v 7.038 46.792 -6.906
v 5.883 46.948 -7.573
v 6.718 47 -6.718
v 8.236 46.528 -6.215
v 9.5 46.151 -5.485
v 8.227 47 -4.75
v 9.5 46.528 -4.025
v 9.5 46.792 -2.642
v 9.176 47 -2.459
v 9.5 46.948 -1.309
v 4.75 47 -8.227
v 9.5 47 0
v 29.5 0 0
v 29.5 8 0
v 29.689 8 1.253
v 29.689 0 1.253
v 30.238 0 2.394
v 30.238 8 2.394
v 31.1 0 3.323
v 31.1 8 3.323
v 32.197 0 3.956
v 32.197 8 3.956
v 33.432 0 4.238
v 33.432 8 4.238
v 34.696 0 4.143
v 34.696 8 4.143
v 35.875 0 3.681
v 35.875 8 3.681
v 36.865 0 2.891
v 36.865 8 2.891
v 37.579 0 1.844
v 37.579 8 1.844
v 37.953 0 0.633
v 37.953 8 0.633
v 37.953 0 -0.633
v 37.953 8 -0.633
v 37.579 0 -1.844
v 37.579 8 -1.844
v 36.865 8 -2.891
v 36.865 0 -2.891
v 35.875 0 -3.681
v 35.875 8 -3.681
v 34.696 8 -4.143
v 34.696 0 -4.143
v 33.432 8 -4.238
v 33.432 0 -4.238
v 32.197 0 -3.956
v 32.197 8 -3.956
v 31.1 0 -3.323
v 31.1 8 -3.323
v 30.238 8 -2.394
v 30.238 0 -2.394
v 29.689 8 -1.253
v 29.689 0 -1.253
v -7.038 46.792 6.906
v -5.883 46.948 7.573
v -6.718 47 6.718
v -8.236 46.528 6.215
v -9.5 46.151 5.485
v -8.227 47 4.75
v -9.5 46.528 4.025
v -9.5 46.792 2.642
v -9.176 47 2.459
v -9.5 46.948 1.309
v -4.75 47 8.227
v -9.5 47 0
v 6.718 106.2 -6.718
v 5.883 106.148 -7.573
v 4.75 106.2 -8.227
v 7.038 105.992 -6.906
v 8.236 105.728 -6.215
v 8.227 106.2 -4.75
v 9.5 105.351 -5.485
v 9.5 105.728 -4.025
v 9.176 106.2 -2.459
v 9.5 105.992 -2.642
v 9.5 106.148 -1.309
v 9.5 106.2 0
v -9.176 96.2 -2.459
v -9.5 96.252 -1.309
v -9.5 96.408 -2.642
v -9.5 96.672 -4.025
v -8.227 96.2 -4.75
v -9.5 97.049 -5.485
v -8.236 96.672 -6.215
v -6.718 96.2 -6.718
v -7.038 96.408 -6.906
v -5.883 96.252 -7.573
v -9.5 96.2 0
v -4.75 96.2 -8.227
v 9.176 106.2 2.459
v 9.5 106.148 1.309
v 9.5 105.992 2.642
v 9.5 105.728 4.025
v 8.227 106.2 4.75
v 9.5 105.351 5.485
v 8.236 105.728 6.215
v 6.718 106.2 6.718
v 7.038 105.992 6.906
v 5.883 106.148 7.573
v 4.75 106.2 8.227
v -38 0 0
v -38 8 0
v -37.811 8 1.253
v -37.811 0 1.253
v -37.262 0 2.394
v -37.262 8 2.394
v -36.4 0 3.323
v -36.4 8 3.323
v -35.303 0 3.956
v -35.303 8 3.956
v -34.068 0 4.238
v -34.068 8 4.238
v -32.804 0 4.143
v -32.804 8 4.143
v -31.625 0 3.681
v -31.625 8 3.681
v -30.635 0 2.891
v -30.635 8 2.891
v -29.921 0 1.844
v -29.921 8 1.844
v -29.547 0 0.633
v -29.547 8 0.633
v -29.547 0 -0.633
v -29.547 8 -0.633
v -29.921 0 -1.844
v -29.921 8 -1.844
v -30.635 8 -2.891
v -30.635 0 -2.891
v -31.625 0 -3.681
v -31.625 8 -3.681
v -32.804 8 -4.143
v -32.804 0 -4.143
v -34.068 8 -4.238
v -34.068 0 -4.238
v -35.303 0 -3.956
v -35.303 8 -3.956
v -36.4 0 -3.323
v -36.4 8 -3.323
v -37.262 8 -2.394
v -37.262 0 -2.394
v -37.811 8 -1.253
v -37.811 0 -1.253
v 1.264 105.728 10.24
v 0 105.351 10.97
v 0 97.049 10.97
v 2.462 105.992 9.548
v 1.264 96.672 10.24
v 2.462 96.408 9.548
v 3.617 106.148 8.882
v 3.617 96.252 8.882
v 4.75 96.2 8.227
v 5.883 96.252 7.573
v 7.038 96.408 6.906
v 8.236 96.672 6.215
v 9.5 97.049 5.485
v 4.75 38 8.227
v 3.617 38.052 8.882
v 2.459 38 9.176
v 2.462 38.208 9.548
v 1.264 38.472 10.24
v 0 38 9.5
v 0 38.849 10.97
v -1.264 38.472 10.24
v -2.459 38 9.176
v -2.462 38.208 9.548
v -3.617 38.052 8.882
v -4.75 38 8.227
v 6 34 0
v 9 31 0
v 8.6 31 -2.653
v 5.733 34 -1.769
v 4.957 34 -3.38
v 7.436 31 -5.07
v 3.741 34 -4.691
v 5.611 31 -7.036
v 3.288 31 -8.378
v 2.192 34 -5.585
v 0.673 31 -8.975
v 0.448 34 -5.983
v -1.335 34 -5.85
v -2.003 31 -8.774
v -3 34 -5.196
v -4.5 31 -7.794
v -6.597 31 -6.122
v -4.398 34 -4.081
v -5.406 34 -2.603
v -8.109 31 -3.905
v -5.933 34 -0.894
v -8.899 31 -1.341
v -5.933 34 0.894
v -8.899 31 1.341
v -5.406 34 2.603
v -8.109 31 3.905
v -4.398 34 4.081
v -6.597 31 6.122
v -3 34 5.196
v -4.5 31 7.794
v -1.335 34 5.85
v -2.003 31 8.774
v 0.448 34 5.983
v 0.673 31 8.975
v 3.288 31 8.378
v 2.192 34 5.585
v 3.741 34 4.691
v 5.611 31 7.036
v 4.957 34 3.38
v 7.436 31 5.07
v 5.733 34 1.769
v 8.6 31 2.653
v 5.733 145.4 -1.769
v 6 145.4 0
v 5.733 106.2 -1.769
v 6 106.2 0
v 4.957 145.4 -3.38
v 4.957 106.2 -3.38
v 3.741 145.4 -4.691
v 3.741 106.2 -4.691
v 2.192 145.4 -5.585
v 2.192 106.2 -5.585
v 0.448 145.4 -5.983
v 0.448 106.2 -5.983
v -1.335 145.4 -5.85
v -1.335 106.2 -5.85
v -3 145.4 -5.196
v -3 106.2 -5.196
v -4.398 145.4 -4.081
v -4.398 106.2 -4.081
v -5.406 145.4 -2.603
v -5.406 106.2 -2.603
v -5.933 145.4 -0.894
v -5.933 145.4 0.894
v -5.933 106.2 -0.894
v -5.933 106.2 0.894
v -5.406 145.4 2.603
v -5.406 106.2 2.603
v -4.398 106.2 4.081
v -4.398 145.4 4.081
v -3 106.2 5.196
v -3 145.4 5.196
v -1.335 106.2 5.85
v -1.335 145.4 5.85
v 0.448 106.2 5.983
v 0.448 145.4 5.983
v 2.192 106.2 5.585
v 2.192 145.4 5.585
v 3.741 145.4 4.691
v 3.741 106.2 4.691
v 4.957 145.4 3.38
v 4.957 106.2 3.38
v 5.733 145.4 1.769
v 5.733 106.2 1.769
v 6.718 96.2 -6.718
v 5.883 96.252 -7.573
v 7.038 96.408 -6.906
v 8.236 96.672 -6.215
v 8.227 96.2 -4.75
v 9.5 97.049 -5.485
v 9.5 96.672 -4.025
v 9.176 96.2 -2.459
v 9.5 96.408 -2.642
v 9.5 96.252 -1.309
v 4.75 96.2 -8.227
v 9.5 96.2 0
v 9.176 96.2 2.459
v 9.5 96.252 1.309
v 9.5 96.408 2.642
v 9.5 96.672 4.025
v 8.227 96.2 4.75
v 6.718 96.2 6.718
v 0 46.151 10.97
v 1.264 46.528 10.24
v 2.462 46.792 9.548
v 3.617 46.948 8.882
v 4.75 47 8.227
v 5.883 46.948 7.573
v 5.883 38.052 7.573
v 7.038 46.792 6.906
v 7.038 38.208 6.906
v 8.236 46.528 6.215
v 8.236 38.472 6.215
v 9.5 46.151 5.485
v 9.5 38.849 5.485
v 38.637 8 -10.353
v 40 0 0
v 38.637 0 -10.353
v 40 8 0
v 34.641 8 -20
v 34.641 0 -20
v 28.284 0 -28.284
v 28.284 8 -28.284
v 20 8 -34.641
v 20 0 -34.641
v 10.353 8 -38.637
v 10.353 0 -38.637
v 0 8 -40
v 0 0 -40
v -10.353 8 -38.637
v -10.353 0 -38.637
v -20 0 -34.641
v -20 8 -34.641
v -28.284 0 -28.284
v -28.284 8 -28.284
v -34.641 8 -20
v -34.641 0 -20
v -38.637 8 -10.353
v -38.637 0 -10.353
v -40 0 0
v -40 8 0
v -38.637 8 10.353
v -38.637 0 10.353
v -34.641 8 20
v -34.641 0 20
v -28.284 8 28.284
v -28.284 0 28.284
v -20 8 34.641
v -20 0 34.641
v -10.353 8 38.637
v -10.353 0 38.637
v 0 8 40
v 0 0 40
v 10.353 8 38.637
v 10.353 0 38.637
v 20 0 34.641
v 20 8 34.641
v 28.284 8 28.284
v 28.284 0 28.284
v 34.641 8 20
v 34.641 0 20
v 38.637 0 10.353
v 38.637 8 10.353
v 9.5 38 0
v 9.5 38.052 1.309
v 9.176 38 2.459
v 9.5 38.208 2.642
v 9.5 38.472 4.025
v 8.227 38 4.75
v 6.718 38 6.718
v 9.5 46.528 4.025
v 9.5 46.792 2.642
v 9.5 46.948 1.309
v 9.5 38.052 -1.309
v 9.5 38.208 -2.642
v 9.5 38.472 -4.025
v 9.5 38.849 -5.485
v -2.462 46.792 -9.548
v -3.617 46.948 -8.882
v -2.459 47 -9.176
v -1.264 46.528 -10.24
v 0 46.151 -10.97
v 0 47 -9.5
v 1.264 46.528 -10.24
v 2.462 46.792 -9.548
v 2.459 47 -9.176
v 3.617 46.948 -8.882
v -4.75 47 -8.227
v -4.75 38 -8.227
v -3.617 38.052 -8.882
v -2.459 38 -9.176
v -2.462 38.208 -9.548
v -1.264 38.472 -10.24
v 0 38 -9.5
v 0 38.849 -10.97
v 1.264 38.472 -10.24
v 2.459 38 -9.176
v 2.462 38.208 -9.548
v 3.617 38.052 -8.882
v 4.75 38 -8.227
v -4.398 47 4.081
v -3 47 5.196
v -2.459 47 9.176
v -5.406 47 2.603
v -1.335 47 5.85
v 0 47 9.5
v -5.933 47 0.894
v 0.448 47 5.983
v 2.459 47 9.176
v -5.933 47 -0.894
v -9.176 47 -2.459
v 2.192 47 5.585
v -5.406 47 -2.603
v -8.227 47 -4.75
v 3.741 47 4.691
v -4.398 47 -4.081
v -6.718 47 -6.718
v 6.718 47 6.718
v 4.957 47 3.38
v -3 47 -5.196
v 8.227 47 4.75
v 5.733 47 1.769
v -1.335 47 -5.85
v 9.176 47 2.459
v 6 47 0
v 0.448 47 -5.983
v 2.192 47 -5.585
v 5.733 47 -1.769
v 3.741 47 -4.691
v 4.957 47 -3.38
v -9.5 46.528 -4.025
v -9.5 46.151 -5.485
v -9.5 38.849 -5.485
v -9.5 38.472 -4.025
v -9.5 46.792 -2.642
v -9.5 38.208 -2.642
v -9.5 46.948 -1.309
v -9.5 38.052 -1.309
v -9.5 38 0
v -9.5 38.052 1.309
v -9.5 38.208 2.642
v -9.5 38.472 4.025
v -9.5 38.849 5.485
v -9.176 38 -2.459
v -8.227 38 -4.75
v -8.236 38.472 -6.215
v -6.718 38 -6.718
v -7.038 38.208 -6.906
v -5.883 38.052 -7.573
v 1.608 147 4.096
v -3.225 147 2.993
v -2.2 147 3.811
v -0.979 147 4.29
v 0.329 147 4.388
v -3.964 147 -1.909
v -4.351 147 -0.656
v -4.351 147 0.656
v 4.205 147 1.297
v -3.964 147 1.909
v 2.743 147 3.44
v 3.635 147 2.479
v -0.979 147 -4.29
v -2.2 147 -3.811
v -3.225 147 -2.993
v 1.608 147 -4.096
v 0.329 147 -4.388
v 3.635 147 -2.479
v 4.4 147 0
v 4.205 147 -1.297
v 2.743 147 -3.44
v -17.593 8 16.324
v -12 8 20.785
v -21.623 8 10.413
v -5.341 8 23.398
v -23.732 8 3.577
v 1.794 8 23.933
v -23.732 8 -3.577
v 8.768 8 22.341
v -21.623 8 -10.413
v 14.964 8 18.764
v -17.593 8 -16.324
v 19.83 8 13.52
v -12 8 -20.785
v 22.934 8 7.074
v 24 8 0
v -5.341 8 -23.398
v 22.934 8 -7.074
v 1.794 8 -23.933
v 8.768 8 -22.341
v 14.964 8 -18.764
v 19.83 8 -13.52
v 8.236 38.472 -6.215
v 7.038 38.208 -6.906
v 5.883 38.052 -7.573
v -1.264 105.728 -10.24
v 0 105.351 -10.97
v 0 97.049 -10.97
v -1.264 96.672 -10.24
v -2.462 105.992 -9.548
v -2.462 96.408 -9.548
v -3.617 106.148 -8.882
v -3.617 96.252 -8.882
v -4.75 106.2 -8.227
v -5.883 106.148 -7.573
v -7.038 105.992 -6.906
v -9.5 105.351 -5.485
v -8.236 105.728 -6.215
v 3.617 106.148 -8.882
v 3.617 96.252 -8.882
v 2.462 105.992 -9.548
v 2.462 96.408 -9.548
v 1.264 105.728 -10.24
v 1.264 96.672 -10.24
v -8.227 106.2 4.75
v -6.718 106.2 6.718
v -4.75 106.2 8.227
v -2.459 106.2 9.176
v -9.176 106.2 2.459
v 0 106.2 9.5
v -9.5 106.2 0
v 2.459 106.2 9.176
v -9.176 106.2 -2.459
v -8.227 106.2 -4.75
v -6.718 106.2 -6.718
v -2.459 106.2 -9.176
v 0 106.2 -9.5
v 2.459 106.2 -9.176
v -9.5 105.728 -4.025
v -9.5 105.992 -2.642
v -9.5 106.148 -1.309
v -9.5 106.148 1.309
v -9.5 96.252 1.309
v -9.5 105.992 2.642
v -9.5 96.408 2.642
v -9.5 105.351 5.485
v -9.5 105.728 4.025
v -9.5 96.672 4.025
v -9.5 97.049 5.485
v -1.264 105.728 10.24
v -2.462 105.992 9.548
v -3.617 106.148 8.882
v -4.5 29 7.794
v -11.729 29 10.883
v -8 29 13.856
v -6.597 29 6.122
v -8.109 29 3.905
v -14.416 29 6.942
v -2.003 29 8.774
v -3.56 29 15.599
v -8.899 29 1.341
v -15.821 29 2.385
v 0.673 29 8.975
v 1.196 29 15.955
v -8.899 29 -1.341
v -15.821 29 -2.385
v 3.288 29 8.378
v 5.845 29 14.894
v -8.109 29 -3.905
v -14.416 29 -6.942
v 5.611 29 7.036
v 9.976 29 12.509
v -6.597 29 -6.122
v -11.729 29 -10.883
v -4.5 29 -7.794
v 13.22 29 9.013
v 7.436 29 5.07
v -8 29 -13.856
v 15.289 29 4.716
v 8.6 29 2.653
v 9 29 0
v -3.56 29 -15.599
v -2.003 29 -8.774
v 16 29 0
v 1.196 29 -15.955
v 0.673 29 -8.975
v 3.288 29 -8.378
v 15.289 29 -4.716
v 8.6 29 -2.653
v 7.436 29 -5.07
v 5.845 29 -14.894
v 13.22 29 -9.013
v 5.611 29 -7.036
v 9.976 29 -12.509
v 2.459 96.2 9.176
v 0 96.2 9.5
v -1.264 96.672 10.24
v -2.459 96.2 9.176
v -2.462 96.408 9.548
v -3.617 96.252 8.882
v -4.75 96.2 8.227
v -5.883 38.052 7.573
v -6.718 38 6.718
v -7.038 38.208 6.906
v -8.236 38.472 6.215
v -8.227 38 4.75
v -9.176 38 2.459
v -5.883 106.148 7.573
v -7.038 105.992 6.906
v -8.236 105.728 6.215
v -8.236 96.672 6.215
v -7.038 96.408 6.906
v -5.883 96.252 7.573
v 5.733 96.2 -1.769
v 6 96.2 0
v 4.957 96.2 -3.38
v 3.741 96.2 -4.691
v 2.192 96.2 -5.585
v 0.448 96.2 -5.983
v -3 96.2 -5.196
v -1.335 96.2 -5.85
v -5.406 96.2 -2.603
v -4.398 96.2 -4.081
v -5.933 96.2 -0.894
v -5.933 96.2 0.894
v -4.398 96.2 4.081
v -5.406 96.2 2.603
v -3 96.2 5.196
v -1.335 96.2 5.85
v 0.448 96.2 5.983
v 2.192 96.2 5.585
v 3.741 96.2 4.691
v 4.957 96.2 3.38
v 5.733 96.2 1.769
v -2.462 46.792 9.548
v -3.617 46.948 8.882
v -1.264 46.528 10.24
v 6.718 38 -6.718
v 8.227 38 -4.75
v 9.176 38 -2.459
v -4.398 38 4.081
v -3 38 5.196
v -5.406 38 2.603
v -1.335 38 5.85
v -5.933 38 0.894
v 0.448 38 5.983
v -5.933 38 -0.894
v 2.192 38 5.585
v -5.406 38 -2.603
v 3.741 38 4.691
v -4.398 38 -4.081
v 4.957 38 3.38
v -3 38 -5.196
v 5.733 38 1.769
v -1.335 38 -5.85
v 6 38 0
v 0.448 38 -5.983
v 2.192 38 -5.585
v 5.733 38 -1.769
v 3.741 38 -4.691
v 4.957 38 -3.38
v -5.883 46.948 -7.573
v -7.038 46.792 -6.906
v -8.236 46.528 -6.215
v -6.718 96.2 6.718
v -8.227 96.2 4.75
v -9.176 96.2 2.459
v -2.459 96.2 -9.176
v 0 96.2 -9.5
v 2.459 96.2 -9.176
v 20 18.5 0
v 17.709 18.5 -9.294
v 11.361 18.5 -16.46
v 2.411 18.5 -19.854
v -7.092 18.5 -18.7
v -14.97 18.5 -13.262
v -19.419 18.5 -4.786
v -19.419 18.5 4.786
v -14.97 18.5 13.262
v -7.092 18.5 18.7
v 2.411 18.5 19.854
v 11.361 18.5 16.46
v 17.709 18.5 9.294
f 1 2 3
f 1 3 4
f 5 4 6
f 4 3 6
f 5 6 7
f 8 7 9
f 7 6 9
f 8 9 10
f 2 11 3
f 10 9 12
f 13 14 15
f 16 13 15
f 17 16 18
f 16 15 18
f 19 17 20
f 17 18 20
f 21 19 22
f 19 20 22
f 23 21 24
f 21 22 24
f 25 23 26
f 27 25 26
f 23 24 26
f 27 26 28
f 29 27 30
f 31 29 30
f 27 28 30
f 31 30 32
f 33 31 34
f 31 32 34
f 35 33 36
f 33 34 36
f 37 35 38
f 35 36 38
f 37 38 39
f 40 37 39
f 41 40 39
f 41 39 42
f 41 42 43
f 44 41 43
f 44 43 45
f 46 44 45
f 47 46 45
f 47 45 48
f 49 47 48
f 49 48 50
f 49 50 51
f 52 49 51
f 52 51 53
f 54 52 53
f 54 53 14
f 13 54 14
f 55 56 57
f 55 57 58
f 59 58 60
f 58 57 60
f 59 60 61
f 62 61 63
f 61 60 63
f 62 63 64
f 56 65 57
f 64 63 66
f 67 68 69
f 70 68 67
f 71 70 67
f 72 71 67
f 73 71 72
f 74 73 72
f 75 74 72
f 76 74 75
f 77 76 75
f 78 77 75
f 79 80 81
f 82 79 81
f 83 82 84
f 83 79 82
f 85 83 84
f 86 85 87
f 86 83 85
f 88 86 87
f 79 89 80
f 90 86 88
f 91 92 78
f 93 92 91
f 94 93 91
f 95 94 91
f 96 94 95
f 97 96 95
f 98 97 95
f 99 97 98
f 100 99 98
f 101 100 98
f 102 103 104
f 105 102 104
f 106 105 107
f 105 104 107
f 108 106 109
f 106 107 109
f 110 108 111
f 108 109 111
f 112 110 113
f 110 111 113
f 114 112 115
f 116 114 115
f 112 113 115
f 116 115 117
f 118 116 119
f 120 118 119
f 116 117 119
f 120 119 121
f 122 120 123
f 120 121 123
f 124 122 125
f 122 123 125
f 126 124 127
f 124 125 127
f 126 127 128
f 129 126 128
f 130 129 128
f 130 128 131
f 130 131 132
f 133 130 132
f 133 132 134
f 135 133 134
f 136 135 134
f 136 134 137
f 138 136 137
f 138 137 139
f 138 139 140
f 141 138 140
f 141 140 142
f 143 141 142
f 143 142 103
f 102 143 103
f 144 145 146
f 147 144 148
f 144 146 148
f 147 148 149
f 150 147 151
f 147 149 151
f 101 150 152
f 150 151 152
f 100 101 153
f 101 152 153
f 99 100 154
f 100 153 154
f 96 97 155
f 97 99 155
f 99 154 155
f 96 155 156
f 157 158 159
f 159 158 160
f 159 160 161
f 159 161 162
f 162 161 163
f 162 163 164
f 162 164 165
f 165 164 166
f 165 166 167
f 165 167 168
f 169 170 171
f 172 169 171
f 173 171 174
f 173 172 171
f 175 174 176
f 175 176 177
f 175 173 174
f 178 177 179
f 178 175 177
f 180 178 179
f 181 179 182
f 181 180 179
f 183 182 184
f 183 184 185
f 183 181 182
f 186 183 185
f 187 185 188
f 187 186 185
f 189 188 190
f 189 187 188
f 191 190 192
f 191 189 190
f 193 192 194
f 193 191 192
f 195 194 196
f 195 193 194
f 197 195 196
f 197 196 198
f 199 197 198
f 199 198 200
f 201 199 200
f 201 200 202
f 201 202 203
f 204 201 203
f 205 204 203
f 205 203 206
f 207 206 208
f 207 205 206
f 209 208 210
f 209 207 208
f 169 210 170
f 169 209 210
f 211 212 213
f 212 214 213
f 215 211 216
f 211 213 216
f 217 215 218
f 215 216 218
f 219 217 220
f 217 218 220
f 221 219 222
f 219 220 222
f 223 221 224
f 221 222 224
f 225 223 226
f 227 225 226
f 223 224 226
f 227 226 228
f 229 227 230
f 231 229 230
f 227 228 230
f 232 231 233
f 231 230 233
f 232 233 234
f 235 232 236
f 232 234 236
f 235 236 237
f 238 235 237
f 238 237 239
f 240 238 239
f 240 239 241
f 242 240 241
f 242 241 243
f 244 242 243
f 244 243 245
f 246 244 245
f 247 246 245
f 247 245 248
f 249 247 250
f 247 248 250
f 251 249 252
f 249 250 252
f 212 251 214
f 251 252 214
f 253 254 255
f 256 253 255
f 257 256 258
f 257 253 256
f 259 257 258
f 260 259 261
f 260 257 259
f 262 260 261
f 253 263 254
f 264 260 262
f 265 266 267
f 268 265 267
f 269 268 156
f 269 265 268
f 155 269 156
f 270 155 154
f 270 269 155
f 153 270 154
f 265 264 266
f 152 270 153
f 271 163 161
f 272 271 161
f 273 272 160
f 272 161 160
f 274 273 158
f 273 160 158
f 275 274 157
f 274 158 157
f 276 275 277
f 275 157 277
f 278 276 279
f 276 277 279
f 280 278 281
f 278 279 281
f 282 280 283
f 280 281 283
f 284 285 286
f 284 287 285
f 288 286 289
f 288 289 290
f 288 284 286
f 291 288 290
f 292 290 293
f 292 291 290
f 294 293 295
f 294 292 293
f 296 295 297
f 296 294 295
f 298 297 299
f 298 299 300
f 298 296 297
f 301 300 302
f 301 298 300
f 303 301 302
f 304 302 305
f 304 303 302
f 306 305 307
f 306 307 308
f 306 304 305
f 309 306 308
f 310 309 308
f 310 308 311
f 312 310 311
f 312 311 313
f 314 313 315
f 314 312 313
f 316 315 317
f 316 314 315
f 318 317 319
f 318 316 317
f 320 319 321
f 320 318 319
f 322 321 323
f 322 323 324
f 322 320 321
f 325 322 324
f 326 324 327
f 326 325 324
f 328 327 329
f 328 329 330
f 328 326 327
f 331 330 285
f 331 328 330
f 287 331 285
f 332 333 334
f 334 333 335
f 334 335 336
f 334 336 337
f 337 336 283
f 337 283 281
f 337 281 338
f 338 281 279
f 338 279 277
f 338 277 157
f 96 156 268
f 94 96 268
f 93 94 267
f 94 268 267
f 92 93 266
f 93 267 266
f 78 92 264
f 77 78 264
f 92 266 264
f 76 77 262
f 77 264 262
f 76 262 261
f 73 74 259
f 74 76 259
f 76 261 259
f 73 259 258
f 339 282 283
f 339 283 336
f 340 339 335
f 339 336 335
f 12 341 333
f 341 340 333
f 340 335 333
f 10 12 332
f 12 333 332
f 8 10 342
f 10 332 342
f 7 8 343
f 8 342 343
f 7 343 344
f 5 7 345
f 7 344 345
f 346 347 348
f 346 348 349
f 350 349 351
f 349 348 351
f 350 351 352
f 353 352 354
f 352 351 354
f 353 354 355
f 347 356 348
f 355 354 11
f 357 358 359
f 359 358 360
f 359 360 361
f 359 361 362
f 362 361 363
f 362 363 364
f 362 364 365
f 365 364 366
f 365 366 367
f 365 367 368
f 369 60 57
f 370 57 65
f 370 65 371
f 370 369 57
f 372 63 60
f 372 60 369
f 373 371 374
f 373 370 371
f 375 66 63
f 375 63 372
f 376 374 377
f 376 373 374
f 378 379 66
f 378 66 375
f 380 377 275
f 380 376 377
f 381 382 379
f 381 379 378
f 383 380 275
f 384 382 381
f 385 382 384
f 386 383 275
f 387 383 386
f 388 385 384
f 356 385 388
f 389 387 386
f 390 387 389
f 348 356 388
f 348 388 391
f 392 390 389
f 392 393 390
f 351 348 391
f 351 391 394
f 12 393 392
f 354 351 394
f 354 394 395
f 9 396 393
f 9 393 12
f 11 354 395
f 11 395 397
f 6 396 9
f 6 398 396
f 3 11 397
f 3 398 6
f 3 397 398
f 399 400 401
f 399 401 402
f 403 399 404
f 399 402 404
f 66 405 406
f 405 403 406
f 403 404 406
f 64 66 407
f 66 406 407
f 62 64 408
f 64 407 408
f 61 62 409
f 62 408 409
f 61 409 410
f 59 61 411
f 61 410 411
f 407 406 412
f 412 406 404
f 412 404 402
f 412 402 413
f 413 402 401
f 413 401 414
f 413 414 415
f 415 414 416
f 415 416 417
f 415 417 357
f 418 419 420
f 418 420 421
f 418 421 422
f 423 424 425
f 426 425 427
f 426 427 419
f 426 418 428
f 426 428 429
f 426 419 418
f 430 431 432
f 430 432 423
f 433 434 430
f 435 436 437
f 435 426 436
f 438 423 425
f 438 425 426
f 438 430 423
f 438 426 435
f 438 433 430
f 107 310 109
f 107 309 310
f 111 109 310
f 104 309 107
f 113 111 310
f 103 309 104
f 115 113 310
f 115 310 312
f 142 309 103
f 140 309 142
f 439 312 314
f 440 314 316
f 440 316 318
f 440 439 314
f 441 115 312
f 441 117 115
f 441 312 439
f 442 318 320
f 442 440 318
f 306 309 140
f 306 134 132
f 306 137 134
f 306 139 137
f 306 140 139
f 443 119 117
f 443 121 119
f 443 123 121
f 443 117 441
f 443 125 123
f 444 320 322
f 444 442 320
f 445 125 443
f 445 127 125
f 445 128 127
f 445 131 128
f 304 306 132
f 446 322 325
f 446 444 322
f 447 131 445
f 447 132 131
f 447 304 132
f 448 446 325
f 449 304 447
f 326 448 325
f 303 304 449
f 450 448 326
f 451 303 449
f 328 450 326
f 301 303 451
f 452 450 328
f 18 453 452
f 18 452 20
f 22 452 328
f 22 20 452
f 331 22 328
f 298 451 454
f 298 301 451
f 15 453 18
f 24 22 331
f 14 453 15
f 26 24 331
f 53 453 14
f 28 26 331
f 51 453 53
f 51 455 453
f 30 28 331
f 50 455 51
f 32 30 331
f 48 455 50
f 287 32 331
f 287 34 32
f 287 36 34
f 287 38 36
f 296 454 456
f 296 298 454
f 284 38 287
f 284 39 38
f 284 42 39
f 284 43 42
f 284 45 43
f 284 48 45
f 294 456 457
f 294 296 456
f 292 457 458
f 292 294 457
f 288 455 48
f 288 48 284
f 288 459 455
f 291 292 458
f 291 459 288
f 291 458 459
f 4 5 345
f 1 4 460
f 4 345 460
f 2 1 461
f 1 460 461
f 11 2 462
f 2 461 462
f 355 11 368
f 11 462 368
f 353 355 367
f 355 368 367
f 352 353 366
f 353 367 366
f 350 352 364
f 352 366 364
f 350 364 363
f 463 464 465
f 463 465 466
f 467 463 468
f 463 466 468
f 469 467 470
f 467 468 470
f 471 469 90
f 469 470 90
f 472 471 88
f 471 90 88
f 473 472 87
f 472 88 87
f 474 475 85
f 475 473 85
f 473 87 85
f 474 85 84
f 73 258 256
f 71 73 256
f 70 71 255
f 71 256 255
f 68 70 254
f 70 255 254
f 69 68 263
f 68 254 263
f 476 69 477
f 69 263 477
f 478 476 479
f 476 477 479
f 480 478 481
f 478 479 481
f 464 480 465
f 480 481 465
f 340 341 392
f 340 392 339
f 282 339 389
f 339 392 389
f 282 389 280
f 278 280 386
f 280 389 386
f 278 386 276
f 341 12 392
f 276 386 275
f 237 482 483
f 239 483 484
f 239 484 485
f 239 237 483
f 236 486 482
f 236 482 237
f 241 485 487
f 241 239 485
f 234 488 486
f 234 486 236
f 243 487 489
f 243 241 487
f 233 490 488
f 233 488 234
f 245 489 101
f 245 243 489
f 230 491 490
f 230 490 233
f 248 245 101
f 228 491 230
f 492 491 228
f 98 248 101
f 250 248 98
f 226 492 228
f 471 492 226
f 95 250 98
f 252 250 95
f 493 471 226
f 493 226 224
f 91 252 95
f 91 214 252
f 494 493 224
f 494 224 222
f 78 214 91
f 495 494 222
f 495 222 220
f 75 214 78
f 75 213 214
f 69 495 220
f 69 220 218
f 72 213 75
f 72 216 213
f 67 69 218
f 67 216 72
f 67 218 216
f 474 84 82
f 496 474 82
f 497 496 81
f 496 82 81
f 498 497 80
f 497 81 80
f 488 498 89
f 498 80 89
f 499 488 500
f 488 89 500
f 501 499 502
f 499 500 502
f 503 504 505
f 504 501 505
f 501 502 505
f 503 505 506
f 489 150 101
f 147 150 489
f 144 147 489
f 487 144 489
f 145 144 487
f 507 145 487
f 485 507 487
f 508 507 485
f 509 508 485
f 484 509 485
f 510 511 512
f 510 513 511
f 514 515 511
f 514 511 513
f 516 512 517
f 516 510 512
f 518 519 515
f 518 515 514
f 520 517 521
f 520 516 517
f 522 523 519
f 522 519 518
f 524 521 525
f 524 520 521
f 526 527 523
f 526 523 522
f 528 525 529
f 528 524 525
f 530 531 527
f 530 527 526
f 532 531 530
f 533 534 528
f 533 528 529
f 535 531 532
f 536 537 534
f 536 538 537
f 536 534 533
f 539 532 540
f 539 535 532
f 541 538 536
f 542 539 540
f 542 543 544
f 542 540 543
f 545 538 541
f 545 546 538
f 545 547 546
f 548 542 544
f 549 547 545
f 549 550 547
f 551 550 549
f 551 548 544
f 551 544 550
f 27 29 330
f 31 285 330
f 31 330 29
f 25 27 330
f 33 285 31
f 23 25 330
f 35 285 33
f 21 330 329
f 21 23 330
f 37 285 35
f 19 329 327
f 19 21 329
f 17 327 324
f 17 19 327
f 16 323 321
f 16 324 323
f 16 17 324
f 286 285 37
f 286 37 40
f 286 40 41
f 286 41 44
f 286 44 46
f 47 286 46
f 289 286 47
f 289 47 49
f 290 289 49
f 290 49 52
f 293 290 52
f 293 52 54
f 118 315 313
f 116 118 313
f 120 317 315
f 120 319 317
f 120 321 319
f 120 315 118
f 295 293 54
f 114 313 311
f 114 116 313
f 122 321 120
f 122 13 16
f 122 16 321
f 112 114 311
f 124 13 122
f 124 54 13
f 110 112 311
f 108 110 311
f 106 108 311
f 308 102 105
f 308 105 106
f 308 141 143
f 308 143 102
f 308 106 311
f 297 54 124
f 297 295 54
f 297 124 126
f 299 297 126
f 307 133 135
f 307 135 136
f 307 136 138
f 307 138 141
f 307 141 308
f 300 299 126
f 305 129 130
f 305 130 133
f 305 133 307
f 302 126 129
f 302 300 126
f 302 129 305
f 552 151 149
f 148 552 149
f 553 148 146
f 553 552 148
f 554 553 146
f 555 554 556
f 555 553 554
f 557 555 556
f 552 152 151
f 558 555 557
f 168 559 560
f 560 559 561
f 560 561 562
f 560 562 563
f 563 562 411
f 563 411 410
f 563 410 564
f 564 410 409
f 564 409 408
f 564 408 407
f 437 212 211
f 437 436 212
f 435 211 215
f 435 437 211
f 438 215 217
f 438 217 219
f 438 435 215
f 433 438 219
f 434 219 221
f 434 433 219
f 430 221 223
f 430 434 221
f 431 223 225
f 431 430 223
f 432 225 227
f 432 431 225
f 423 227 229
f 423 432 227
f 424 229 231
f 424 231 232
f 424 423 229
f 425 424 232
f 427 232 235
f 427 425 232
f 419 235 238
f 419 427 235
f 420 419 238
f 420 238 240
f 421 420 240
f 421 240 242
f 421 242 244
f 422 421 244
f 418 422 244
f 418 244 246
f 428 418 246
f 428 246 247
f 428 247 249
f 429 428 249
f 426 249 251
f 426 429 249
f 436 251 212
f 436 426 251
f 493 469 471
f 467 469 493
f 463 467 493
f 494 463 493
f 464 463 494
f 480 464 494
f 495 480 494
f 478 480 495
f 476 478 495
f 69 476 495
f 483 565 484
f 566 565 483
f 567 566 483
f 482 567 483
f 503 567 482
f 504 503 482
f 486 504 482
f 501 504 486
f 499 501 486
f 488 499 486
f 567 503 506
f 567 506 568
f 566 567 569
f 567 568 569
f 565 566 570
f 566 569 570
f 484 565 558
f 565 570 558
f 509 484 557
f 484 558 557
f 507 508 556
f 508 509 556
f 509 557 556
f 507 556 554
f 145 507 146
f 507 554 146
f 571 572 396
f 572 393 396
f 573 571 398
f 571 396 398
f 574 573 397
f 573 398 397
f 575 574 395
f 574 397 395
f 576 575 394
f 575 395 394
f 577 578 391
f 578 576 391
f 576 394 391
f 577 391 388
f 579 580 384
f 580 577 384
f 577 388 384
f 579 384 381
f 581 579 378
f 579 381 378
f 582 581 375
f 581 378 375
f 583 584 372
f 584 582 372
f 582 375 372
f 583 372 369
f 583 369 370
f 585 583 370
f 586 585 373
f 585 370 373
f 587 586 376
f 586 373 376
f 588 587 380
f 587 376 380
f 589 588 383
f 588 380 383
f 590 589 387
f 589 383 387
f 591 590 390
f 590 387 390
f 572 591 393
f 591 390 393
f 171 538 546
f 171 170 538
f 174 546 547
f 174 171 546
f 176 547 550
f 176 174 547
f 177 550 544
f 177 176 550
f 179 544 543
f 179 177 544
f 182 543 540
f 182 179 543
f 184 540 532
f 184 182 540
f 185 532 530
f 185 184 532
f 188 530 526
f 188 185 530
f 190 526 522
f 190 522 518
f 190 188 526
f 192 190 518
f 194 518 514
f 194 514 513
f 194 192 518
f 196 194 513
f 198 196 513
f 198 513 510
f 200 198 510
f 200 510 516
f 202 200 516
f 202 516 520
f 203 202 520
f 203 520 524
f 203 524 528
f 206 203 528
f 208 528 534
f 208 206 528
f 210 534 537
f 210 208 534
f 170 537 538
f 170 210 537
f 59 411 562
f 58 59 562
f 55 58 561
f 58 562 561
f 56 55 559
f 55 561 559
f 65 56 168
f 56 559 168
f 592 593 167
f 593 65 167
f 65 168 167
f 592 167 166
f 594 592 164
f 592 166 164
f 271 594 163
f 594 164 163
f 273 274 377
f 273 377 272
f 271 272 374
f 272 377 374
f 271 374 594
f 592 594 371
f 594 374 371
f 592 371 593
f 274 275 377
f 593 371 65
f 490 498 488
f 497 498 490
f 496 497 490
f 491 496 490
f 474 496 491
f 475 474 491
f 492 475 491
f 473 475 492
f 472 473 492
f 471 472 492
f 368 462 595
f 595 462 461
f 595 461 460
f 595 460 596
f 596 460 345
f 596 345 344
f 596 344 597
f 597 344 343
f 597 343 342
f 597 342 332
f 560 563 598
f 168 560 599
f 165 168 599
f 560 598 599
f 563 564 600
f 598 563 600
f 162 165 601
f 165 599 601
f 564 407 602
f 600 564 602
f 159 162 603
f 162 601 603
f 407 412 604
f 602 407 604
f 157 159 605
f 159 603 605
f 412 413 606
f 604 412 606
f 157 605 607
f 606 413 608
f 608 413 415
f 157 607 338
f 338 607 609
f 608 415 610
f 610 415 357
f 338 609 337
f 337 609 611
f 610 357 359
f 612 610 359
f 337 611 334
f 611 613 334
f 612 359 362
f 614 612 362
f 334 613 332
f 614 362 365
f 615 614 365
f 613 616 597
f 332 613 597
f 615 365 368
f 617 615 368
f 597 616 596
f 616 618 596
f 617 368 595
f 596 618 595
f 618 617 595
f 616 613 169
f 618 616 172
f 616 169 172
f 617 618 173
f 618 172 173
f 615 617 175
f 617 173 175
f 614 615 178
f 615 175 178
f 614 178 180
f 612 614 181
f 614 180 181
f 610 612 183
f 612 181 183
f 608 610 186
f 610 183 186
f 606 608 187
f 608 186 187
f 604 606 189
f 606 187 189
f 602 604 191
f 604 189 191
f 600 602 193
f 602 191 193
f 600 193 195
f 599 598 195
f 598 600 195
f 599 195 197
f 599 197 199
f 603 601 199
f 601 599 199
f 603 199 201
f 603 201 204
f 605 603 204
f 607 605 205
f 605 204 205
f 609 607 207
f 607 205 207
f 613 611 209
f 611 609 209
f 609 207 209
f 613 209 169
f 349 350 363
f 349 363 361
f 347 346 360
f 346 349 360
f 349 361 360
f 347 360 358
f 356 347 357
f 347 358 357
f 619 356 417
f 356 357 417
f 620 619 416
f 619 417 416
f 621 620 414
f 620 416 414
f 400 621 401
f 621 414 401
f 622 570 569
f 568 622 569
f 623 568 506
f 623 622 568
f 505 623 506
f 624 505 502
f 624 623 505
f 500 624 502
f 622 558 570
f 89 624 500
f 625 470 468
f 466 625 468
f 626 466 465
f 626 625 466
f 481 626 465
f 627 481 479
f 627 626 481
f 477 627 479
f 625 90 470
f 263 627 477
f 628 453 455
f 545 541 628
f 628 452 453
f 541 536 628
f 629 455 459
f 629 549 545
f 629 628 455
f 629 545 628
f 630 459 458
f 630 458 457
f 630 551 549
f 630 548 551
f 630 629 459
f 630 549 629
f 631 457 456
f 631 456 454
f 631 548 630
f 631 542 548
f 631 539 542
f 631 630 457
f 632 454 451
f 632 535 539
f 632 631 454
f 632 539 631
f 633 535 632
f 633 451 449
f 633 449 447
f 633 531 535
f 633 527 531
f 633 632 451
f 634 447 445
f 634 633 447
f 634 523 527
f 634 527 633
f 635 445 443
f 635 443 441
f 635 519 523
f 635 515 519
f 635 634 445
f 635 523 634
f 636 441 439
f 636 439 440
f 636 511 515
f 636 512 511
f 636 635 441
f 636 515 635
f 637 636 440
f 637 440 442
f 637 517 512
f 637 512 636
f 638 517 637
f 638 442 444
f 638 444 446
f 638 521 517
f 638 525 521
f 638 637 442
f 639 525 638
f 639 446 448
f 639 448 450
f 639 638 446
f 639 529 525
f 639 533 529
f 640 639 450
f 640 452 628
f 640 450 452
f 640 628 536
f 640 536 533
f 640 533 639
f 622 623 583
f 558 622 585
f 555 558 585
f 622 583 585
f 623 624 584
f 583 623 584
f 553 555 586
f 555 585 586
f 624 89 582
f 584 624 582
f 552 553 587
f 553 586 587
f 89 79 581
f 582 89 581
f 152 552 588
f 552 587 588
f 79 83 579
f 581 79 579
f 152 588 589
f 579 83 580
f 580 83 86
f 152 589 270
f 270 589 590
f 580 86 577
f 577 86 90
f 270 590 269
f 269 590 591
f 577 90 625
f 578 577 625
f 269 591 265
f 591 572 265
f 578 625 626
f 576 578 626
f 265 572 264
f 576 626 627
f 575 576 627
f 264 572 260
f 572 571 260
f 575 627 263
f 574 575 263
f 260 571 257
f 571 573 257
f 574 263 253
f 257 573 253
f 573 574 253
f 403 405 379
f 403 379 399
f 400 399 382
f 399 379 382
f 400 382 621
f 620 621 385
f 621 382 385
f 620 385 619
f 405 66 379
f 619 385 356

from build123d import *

# Parameters (mm, degrees)
EXTRUDE_1_DEPTH     = 9
EXTRUDE_2_DEPTH     = 10
SKETCH_5_R          = 4.25
CUT_EXTRUDE_1_DEPTH = 9


with BuildPart() as part:
    # Эскиз1 → Повернуть1 (revolve)
    with BuildSketch(Plane.XY, mode=Mode.PRIVATE) as revolve_1_sk:
        Polygon((0, 0), (-40, 0), (-40, 8), (-24, 8), (-16, 29), (-9, 29), (-9, 31), (-6, 34), (-6, 38), (-6, 47), (-6, 145.4), (-4.4, 147), (0, 147), align=None)
    revolve(revolve_1_sk.sketch.rotate(Axis((0, 0, 0), (0, 1, 0)), 180), axis=Axis((0, 0, 0), (0, 1, 0)))  # turned: the seam where the file's is

    # Эскиз2 → Бобышка-Вытянуть1 (add)
    with BuildSketch(Plane(origin=(0, 38, 0), x_dir=(1, 0, 0), z_dir=(0, 1, 0))):
        Polygon((0, 10.969655115), (-9.5, 5.484827557), (-9.5, -5.484827557), (0, -10.969655115), (9.5, -5.484827557), (9.5, 5.484827557), align=None)
    extrude(amount=EXTRUDE_1_DEPTH)

    # Эскиз3 → Бобышка-Вытянуть2 (add)
    with BuildSketch(Plane(origin=(0, 96.2, 0), x_dir=(1, 0, 0), z_dir=(0, 1, 0))):
        Polygon((9.5, 5.484827557), (0, 10.969655115), (-9.5, 5.484827557), (-9.5, -5.484827557), (0, -10.969655115), (9.5, -5.484827557), align=None)
    extrude(amount=EXTRUDE_2_DEPTH)

    # Эскиз4 → Вырез-Повернуть2 (revolve, cut)
    with BuildSketch(Plane.XY, mode=Mode.PRIVATE) as cut_revolve_2_sk:
        Polygon((-18.160254038, 106.2), (-9.5, 106.2), (-18.160254038, 101.2), align=None)
        Polygon((-18.160254038, 96.2), (-18.160254038, 101.2), (-9.5, 96.2), align=None)
        Polygon((-17.294228634, 47), (-17.294228634, 42.5), (-9.5, 47), align=None)
        Polygon((-17.294228634, 42.5), (-17.294228634, 38), (-9.5, 38), align=None)
    revolve(cut_revolve_2_sk.sketch.rotate(Axis((0, 147, 0), (0, -1, 0)), 180), axis=Axis((0, 147, 0), (0, -1, 0)), mode=Mode.SUBTRACT)  # turned: the seam where the file's is

    # Эскиз5 → Вырез-Вытянуть1 (cut, through all)
    with BuildSketch(Plane(origin=(0, 8, 0), x_dir=(1, 0, 0), z_dir=(0, 1, 0))):
        with Locations(Location((-33.75, 0, 0), (0, 0, 180))):  # turned: the seam where the file's is
            Circle(SKETCH_5_R)
        with Locations(Location((33.75, 0, 0), (0, 0, 180))):  # turned: the seam where the file's is
            Circle(SKETCH_5_R)
    extrude(amount=-CUT_EXTRUDE_1_DEPTH, mode=Mode.SUBTRACT)


solid = part.part
